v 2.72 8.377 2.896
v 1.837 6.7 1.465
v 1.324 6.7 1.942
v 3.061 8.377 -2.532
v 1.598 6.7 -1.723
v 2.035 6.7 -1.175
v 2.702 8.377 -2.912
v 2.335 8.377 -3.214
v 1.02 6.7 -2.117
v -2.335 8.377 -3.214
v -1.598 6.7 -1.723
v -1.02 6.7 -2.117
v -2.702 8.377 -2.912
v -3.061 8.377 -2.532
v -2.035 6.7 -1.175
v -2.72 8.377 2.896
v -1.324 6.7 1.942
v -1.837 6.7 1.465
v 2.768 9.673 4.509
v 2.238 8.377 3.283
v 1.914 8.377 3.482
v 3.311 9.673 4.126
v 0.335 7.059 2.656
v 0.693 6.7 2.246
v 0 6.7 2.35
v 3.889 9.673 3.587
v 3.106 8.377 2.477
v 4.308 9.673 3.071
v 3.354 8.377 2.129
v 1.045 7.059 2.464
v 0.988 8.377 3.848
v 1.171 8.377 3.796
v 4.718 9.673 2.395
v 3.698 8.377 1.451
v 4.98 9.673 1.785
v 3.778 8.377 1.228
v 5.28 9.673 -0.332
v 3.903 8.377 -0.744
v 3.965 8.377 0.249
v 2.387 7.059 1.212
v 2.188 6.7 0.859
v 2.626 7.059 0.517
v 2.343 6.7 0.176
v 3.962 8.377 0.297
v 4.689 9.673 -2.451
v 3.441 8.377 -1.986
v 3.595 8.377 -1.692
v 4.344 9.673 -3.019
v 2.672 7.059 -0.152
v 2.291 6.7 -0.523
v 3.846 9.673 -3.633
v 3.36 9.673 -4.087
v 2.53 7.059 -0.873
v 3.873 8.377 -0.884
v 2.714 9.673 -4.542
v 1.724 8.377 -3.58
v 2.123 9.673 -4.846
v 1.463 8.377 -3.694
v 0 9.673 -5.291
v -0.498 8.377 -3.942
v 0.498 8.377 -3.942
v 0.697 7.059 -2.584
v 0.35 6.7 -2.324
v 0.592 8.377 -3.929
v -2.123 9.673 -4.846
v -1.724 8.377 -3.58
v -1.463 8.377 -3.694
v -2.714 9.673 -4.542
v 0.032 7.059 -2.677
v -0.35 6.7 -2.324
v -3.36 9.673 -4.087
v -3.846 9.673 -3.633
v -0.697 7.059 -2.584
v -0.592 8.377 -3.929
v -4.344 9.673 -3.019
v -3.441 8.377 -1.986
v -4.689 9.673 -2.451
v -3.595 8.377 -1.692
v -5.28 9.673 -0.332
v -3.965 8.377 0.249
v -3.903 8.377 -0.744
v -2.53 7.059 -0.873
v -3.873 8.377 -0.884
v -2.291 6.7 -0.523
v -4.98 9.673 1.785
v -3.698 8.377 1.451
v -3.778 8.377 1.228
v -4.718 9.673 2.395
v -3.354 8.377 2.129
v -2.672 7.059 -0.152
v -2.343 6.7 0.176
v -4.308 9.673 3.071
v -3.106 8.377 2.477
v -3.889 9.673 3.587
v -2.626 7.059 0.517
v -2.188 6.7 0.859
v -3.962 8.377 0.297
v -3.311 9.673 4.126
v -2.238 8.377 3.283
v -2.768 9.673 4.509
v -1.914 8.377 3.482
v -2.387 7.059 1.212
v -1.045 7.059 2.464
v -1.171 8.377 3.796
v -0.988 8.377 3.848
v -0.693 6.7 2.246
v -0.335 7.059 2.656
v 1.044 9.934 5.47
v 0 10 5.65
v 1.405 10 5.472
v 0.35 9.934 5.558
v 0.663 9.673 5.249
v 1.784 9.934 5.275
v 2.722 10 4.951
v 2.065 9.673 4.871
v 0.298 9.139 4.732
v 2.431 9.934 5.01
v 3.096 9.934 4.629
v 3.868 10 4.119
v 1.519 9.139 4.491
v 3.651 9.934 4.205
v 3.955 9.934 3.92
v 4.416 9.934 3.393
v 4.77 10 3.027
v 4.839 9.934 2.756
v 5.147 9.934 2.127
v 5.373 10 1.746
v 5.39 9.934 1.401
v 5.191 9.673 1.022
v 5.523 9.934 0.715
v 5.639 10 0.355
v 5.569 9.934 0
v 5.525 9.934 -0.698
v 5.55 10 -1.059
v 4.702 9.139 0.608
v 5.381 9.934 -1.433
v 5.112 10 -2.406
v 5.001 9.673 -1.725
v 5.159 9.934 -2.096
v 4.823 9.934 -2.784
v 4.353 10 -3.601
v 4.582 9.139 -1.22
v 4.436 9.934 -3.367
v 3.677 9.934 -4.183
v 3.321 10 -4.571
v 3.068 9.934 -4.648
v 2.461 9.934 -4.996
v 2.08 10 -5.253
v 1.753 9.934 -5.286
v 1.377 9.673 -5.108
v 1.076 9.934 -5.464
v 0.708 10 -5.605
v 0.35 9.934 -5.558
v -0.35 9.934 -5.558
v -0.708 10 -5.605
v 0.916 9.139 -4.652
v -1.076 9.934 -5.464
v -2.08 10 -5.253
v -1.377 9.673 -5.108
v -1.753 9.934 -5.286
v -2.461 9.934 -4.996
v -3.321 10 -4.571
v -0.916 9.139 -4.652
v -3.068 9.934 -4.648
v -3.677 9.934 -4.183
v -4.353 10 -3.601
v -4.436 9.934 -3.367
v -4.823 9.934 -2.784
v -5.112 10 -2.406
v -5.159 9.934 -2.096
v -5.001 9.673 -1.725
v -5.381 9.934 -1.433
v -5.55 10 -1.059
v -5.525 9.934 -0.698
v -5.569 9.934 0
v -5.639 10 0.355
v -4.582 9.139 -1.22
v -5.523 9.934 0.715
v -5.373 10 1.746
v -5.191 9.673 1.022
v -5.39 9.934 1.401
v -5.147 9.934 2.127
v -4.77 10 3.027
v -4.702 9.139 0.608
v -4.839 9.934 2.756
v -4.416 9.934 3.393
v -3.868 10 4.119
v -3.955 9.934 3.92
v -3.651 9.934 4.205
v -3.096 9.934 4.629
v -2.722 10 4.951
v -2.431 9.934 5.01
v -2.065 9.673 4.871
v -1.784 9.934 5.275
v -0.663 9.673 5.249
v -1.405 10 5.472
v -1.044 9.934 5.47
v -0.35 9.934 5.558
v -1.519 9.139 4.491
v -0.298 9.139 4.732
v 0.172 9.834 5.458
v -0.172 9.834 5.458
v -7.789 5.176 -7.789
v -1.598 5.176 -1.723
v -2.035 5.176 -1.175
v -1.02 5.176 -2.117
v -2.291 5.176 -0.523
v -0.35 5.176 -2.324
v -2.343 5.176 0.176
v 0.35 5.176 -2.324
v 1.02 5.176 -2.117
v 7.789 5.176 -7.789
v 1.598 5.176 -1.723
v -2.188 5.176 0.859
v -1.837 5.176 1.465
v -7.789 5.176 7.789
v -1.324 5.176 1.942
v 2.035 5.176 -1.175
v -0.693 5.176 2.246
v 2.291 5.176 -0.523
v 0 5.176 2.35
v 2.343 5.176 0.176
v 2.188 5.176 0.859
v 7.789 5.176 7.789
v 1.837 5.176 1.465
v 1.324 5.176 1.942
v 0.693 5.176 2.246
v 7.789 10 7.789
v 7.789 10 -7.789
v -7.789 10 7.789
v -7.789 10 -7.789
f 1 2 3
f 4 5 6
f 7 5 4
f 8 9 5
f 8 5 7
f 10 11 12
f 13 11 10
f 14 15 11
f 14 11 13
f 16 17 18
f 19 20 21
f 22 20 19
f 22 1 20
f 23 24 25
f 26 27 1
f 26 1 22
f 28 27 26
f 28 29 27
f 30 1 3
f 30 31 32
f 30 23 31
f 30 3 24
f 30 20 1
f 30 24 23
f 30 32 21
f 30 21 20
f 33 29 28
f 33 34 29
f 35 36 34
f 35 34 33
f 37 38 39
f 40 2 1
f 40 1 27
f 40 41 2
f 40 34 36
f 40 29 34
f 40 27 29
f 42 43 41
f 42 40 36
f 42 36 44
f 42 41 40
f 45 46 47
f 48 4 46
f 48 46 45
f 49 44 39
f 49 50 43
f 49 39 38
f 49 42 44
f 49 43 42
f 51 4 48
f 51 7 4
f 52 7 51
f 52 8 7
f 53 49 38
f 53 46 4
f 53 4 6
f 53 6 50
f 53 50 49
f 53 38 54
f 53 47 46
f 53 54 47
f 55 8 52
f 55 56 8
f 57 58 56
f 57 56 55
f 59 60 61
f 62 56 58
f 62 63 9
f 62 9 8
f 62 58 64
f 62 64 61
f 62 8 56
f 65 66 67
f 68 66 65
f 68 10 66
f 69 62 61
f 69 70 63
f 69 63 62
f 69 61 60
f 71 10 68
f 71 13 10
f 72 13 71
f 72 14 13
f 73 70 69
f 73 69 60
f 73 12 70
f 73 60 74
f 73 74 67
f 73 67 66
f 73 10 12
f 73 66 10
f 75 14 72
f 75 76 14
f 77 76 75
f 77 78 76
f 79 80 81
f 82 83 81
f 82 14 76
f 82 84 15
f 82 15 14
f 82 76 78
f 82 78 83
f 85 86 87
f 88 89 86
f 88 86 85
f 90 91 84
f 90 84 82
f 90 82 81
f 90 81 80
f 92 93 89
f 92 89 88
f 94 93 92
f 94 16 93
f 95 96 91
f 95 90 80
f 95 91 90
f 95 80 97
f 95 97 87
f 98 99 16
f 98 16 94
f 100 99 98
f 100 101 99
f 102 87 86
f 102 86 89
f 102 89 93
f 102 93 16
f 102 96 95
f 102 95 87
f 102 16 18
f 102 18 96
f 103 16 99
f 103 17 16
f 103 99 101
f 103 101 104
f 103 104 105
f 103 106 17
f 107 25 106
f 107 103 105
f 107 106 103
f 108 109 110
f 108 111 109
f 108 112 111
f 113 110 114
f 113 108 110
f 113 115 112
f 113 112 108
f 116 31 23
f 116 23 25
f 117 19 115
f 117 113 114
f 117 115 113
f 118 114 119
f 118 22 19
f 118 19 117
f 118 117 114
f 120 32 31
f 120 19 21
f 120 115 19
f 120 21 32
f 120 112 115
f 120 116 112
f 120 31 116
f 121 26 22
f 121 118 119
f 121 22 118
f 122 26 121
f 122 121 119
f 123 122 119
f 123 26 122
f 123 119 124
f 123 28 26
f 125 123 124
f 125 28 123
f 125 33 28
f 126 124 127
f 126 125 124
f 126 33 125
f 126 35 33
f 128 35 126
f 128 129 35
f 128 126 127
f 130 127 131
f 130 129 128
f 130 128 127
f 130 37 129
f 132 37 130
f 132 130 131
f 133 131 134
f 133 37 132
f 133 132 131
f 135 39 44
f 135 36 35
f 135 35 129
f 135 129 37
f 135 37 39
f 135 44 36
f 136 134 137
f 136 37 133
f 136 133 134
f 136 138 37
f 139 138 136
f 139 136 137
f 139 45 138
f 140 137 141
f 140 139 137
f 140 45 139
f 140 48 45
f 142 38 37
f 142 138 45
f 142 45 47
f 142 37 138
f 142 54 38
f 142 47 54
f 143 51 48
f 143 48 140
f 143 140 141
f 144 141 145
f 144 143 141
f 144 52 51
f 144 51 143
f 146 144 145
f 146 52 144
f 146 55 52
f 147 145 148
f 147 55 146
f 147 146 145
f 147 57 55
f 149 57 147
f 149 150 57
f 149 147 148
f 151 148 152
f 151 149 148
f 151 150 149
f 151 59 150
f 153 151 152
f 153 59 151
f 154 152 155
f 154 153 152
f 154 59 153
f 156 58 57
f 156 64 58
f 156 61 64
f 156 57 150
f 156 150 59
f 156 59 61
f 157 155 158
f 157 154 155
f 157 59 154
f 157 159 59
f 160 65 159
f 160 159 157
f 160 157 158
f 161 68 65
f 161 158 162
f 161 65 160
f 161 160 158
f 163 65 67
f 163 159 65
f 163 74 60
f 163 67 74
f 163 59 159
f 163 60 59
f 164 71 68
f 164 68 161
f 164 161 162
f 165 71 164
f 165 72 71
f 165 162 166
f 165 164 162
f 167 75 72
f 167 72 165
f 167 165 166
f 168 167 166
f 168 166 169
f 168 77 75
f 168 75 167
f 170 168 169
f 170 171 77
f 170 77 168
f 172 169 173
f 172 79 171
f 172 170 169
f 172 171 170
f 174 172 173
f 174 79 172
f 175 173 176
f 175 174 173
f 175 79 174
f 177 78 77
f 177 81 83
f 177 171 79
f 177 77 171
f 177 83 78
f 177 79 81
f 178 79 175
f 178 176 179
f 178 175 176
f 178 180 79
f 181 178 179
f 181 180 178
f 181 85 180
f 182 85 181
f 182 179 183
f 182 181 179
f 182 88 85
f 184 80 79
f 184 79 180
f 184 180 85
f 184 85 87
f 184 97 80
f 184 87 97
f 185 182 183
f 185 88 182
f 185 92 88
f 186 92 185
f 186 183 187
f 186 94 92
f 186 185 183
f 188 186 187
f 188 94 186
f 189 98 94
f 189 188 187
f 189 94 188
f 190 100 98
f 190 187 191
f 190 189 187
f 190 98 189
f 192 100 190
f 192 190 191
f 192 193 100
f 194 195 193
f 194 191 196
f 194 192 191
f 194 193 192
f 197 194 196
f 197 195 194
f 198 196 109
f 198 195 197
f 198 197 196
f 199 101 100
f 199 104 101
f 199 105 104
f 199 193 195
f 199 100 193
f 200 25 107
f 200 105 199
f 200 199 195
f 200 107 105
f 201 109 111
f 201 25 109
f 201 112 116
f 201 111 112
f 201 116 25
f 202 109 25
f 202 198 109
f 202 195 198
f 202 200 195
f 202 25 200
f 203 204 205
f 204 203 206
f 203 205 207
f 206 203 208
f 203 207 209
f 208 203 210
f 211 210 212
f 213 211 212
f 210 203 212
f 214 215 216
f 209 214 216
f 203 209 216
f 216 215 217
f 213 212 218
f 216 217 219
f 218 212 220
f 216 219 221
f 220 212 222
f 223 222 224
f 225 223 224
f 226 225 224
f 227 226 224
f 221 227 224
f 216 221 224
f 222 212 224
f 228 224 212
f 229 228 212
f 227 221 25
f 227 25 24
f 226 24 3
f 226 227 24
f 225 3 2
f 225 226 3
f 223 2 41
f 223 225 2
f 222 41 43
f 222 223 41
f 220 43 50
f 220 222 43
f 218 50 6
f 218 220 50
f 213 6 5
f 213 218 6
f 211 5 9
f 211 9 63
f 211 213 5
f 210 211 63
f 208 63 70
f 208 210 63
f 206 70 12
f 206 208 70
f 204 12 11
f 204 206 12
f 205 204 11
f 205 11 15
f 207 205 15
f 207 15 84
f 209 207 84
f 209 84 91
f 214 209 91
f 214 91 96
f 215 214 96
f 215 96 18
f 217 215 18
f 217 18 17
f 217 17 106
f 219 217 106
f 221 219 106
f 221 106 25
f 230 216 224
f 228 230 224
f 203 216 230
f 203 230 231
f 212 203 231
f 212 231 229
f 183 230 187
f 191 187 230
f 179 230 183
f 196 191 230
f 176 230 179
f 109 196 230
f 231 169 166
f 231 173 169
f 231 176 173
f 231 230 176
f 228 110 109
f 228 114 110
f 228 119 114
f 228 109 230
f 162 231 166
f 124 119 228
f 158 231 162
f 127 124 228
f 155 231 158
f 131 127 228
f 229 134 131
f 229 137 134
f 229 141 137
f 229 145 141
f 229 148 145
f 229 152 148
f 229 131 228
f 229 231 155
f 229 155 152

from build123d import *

# Parameters (mm, degrees)
SKETCH1_W               = 15.577947364
SKETCH1_H               = 15.577947364
BOSS_EXTRUDE2_DEPTH     = 10
CUT_EXTRUDE1_DEPTH      = 15.877372821
CUT_EXTRUDE1_DEPTH_BACK = 15.877372821
SKETCH2_R               = 2.35
FILLET3_SIZE            = 3.3
CUT_EXTRUDE2_DEPTH      = 21.083340288
CUT_EXTRUDE2_DEPTH_BACK = 21.083340288
SKETCH9_W               = 17.356055064
SKETCH9_H               = 10.947578027


with BuildPart() as part:
    # Sketch1 → Boss-Extrude2 (new body)
    with BuildSketch(Plane(origin=(0, 0, 0), x_dir=(1, 0, 0), z_dir=(0, 1, 0))):
        Rectangle(SKETCH1_W, SKETCH1_H)
    extrude(amount=BOSS_EXTRUDE2_DEPTH)

    # Sketch2 → Cut-Extrude1 (cut, two sides: drawn at the far end of the back side and taken through both)
    with BuildSketch(Plane(origin=(0, 10, 0), x_dir=(1, 0, 0), z_dir=(0, 1, 0)).offset(-CUT_EXTRUDE1_DEPTH_BACK)):
        with Locations(Location((0, 0, 0), (0, 0, 270))):
            Circle(SKETCH2_R)
    extrude(amount=CUT_EXTRUDE1_DEPTH + CUT_EXTRUDE1_DEPTH_BACK, mode=Mode.SUBTRACT)

    # Fillet3
    # a fillet whose section is not a circle: 3.3 mm, written as the material it takes off along each edge
    with BuildSketch(Plane(origin=(0, 10, 0), x_dir=(0, 0, 1), z_dir=(-1, 0, 0))) as fillet3_piece_1:
        with BuildLine():
            Bezier((2.35 + FILLET3_SIZE, 0), (2.35, 0), (2.35, -FILLET3_SIZE), weights=[1, 0.016667517, 1])
            Line((2.35, -FILLET3_SIZE), (2.35, 0))
            Line((2.35, 0), (2.35 + FILLET3_SIZE, 0))
        make_face()
    revolve(axis=Axis((0, 10, 0), (0, 1, 0)), mode=Mode.SUBTRACT)

    # Sketch9 → Cut-Extrude2 (cut, two sides: drawn at the far end of the back side and taken through both)
    with BuildSketch(Plane.ZY.offset(7.788973682).offset(-CUT_EXTRUDE2_DEPTH_BACK)):
        with Locations((-0.203270831, -0.297866067)):
            Rectangle(SKETCH9_W, SKETCH9_H)
    extrude(amount=CUT_EXTRUDE2_DEPTH + CUT_EXTRUDE2_DEPTH_BACK, mode=Mode.SUBTRACT)


solid = part.part
